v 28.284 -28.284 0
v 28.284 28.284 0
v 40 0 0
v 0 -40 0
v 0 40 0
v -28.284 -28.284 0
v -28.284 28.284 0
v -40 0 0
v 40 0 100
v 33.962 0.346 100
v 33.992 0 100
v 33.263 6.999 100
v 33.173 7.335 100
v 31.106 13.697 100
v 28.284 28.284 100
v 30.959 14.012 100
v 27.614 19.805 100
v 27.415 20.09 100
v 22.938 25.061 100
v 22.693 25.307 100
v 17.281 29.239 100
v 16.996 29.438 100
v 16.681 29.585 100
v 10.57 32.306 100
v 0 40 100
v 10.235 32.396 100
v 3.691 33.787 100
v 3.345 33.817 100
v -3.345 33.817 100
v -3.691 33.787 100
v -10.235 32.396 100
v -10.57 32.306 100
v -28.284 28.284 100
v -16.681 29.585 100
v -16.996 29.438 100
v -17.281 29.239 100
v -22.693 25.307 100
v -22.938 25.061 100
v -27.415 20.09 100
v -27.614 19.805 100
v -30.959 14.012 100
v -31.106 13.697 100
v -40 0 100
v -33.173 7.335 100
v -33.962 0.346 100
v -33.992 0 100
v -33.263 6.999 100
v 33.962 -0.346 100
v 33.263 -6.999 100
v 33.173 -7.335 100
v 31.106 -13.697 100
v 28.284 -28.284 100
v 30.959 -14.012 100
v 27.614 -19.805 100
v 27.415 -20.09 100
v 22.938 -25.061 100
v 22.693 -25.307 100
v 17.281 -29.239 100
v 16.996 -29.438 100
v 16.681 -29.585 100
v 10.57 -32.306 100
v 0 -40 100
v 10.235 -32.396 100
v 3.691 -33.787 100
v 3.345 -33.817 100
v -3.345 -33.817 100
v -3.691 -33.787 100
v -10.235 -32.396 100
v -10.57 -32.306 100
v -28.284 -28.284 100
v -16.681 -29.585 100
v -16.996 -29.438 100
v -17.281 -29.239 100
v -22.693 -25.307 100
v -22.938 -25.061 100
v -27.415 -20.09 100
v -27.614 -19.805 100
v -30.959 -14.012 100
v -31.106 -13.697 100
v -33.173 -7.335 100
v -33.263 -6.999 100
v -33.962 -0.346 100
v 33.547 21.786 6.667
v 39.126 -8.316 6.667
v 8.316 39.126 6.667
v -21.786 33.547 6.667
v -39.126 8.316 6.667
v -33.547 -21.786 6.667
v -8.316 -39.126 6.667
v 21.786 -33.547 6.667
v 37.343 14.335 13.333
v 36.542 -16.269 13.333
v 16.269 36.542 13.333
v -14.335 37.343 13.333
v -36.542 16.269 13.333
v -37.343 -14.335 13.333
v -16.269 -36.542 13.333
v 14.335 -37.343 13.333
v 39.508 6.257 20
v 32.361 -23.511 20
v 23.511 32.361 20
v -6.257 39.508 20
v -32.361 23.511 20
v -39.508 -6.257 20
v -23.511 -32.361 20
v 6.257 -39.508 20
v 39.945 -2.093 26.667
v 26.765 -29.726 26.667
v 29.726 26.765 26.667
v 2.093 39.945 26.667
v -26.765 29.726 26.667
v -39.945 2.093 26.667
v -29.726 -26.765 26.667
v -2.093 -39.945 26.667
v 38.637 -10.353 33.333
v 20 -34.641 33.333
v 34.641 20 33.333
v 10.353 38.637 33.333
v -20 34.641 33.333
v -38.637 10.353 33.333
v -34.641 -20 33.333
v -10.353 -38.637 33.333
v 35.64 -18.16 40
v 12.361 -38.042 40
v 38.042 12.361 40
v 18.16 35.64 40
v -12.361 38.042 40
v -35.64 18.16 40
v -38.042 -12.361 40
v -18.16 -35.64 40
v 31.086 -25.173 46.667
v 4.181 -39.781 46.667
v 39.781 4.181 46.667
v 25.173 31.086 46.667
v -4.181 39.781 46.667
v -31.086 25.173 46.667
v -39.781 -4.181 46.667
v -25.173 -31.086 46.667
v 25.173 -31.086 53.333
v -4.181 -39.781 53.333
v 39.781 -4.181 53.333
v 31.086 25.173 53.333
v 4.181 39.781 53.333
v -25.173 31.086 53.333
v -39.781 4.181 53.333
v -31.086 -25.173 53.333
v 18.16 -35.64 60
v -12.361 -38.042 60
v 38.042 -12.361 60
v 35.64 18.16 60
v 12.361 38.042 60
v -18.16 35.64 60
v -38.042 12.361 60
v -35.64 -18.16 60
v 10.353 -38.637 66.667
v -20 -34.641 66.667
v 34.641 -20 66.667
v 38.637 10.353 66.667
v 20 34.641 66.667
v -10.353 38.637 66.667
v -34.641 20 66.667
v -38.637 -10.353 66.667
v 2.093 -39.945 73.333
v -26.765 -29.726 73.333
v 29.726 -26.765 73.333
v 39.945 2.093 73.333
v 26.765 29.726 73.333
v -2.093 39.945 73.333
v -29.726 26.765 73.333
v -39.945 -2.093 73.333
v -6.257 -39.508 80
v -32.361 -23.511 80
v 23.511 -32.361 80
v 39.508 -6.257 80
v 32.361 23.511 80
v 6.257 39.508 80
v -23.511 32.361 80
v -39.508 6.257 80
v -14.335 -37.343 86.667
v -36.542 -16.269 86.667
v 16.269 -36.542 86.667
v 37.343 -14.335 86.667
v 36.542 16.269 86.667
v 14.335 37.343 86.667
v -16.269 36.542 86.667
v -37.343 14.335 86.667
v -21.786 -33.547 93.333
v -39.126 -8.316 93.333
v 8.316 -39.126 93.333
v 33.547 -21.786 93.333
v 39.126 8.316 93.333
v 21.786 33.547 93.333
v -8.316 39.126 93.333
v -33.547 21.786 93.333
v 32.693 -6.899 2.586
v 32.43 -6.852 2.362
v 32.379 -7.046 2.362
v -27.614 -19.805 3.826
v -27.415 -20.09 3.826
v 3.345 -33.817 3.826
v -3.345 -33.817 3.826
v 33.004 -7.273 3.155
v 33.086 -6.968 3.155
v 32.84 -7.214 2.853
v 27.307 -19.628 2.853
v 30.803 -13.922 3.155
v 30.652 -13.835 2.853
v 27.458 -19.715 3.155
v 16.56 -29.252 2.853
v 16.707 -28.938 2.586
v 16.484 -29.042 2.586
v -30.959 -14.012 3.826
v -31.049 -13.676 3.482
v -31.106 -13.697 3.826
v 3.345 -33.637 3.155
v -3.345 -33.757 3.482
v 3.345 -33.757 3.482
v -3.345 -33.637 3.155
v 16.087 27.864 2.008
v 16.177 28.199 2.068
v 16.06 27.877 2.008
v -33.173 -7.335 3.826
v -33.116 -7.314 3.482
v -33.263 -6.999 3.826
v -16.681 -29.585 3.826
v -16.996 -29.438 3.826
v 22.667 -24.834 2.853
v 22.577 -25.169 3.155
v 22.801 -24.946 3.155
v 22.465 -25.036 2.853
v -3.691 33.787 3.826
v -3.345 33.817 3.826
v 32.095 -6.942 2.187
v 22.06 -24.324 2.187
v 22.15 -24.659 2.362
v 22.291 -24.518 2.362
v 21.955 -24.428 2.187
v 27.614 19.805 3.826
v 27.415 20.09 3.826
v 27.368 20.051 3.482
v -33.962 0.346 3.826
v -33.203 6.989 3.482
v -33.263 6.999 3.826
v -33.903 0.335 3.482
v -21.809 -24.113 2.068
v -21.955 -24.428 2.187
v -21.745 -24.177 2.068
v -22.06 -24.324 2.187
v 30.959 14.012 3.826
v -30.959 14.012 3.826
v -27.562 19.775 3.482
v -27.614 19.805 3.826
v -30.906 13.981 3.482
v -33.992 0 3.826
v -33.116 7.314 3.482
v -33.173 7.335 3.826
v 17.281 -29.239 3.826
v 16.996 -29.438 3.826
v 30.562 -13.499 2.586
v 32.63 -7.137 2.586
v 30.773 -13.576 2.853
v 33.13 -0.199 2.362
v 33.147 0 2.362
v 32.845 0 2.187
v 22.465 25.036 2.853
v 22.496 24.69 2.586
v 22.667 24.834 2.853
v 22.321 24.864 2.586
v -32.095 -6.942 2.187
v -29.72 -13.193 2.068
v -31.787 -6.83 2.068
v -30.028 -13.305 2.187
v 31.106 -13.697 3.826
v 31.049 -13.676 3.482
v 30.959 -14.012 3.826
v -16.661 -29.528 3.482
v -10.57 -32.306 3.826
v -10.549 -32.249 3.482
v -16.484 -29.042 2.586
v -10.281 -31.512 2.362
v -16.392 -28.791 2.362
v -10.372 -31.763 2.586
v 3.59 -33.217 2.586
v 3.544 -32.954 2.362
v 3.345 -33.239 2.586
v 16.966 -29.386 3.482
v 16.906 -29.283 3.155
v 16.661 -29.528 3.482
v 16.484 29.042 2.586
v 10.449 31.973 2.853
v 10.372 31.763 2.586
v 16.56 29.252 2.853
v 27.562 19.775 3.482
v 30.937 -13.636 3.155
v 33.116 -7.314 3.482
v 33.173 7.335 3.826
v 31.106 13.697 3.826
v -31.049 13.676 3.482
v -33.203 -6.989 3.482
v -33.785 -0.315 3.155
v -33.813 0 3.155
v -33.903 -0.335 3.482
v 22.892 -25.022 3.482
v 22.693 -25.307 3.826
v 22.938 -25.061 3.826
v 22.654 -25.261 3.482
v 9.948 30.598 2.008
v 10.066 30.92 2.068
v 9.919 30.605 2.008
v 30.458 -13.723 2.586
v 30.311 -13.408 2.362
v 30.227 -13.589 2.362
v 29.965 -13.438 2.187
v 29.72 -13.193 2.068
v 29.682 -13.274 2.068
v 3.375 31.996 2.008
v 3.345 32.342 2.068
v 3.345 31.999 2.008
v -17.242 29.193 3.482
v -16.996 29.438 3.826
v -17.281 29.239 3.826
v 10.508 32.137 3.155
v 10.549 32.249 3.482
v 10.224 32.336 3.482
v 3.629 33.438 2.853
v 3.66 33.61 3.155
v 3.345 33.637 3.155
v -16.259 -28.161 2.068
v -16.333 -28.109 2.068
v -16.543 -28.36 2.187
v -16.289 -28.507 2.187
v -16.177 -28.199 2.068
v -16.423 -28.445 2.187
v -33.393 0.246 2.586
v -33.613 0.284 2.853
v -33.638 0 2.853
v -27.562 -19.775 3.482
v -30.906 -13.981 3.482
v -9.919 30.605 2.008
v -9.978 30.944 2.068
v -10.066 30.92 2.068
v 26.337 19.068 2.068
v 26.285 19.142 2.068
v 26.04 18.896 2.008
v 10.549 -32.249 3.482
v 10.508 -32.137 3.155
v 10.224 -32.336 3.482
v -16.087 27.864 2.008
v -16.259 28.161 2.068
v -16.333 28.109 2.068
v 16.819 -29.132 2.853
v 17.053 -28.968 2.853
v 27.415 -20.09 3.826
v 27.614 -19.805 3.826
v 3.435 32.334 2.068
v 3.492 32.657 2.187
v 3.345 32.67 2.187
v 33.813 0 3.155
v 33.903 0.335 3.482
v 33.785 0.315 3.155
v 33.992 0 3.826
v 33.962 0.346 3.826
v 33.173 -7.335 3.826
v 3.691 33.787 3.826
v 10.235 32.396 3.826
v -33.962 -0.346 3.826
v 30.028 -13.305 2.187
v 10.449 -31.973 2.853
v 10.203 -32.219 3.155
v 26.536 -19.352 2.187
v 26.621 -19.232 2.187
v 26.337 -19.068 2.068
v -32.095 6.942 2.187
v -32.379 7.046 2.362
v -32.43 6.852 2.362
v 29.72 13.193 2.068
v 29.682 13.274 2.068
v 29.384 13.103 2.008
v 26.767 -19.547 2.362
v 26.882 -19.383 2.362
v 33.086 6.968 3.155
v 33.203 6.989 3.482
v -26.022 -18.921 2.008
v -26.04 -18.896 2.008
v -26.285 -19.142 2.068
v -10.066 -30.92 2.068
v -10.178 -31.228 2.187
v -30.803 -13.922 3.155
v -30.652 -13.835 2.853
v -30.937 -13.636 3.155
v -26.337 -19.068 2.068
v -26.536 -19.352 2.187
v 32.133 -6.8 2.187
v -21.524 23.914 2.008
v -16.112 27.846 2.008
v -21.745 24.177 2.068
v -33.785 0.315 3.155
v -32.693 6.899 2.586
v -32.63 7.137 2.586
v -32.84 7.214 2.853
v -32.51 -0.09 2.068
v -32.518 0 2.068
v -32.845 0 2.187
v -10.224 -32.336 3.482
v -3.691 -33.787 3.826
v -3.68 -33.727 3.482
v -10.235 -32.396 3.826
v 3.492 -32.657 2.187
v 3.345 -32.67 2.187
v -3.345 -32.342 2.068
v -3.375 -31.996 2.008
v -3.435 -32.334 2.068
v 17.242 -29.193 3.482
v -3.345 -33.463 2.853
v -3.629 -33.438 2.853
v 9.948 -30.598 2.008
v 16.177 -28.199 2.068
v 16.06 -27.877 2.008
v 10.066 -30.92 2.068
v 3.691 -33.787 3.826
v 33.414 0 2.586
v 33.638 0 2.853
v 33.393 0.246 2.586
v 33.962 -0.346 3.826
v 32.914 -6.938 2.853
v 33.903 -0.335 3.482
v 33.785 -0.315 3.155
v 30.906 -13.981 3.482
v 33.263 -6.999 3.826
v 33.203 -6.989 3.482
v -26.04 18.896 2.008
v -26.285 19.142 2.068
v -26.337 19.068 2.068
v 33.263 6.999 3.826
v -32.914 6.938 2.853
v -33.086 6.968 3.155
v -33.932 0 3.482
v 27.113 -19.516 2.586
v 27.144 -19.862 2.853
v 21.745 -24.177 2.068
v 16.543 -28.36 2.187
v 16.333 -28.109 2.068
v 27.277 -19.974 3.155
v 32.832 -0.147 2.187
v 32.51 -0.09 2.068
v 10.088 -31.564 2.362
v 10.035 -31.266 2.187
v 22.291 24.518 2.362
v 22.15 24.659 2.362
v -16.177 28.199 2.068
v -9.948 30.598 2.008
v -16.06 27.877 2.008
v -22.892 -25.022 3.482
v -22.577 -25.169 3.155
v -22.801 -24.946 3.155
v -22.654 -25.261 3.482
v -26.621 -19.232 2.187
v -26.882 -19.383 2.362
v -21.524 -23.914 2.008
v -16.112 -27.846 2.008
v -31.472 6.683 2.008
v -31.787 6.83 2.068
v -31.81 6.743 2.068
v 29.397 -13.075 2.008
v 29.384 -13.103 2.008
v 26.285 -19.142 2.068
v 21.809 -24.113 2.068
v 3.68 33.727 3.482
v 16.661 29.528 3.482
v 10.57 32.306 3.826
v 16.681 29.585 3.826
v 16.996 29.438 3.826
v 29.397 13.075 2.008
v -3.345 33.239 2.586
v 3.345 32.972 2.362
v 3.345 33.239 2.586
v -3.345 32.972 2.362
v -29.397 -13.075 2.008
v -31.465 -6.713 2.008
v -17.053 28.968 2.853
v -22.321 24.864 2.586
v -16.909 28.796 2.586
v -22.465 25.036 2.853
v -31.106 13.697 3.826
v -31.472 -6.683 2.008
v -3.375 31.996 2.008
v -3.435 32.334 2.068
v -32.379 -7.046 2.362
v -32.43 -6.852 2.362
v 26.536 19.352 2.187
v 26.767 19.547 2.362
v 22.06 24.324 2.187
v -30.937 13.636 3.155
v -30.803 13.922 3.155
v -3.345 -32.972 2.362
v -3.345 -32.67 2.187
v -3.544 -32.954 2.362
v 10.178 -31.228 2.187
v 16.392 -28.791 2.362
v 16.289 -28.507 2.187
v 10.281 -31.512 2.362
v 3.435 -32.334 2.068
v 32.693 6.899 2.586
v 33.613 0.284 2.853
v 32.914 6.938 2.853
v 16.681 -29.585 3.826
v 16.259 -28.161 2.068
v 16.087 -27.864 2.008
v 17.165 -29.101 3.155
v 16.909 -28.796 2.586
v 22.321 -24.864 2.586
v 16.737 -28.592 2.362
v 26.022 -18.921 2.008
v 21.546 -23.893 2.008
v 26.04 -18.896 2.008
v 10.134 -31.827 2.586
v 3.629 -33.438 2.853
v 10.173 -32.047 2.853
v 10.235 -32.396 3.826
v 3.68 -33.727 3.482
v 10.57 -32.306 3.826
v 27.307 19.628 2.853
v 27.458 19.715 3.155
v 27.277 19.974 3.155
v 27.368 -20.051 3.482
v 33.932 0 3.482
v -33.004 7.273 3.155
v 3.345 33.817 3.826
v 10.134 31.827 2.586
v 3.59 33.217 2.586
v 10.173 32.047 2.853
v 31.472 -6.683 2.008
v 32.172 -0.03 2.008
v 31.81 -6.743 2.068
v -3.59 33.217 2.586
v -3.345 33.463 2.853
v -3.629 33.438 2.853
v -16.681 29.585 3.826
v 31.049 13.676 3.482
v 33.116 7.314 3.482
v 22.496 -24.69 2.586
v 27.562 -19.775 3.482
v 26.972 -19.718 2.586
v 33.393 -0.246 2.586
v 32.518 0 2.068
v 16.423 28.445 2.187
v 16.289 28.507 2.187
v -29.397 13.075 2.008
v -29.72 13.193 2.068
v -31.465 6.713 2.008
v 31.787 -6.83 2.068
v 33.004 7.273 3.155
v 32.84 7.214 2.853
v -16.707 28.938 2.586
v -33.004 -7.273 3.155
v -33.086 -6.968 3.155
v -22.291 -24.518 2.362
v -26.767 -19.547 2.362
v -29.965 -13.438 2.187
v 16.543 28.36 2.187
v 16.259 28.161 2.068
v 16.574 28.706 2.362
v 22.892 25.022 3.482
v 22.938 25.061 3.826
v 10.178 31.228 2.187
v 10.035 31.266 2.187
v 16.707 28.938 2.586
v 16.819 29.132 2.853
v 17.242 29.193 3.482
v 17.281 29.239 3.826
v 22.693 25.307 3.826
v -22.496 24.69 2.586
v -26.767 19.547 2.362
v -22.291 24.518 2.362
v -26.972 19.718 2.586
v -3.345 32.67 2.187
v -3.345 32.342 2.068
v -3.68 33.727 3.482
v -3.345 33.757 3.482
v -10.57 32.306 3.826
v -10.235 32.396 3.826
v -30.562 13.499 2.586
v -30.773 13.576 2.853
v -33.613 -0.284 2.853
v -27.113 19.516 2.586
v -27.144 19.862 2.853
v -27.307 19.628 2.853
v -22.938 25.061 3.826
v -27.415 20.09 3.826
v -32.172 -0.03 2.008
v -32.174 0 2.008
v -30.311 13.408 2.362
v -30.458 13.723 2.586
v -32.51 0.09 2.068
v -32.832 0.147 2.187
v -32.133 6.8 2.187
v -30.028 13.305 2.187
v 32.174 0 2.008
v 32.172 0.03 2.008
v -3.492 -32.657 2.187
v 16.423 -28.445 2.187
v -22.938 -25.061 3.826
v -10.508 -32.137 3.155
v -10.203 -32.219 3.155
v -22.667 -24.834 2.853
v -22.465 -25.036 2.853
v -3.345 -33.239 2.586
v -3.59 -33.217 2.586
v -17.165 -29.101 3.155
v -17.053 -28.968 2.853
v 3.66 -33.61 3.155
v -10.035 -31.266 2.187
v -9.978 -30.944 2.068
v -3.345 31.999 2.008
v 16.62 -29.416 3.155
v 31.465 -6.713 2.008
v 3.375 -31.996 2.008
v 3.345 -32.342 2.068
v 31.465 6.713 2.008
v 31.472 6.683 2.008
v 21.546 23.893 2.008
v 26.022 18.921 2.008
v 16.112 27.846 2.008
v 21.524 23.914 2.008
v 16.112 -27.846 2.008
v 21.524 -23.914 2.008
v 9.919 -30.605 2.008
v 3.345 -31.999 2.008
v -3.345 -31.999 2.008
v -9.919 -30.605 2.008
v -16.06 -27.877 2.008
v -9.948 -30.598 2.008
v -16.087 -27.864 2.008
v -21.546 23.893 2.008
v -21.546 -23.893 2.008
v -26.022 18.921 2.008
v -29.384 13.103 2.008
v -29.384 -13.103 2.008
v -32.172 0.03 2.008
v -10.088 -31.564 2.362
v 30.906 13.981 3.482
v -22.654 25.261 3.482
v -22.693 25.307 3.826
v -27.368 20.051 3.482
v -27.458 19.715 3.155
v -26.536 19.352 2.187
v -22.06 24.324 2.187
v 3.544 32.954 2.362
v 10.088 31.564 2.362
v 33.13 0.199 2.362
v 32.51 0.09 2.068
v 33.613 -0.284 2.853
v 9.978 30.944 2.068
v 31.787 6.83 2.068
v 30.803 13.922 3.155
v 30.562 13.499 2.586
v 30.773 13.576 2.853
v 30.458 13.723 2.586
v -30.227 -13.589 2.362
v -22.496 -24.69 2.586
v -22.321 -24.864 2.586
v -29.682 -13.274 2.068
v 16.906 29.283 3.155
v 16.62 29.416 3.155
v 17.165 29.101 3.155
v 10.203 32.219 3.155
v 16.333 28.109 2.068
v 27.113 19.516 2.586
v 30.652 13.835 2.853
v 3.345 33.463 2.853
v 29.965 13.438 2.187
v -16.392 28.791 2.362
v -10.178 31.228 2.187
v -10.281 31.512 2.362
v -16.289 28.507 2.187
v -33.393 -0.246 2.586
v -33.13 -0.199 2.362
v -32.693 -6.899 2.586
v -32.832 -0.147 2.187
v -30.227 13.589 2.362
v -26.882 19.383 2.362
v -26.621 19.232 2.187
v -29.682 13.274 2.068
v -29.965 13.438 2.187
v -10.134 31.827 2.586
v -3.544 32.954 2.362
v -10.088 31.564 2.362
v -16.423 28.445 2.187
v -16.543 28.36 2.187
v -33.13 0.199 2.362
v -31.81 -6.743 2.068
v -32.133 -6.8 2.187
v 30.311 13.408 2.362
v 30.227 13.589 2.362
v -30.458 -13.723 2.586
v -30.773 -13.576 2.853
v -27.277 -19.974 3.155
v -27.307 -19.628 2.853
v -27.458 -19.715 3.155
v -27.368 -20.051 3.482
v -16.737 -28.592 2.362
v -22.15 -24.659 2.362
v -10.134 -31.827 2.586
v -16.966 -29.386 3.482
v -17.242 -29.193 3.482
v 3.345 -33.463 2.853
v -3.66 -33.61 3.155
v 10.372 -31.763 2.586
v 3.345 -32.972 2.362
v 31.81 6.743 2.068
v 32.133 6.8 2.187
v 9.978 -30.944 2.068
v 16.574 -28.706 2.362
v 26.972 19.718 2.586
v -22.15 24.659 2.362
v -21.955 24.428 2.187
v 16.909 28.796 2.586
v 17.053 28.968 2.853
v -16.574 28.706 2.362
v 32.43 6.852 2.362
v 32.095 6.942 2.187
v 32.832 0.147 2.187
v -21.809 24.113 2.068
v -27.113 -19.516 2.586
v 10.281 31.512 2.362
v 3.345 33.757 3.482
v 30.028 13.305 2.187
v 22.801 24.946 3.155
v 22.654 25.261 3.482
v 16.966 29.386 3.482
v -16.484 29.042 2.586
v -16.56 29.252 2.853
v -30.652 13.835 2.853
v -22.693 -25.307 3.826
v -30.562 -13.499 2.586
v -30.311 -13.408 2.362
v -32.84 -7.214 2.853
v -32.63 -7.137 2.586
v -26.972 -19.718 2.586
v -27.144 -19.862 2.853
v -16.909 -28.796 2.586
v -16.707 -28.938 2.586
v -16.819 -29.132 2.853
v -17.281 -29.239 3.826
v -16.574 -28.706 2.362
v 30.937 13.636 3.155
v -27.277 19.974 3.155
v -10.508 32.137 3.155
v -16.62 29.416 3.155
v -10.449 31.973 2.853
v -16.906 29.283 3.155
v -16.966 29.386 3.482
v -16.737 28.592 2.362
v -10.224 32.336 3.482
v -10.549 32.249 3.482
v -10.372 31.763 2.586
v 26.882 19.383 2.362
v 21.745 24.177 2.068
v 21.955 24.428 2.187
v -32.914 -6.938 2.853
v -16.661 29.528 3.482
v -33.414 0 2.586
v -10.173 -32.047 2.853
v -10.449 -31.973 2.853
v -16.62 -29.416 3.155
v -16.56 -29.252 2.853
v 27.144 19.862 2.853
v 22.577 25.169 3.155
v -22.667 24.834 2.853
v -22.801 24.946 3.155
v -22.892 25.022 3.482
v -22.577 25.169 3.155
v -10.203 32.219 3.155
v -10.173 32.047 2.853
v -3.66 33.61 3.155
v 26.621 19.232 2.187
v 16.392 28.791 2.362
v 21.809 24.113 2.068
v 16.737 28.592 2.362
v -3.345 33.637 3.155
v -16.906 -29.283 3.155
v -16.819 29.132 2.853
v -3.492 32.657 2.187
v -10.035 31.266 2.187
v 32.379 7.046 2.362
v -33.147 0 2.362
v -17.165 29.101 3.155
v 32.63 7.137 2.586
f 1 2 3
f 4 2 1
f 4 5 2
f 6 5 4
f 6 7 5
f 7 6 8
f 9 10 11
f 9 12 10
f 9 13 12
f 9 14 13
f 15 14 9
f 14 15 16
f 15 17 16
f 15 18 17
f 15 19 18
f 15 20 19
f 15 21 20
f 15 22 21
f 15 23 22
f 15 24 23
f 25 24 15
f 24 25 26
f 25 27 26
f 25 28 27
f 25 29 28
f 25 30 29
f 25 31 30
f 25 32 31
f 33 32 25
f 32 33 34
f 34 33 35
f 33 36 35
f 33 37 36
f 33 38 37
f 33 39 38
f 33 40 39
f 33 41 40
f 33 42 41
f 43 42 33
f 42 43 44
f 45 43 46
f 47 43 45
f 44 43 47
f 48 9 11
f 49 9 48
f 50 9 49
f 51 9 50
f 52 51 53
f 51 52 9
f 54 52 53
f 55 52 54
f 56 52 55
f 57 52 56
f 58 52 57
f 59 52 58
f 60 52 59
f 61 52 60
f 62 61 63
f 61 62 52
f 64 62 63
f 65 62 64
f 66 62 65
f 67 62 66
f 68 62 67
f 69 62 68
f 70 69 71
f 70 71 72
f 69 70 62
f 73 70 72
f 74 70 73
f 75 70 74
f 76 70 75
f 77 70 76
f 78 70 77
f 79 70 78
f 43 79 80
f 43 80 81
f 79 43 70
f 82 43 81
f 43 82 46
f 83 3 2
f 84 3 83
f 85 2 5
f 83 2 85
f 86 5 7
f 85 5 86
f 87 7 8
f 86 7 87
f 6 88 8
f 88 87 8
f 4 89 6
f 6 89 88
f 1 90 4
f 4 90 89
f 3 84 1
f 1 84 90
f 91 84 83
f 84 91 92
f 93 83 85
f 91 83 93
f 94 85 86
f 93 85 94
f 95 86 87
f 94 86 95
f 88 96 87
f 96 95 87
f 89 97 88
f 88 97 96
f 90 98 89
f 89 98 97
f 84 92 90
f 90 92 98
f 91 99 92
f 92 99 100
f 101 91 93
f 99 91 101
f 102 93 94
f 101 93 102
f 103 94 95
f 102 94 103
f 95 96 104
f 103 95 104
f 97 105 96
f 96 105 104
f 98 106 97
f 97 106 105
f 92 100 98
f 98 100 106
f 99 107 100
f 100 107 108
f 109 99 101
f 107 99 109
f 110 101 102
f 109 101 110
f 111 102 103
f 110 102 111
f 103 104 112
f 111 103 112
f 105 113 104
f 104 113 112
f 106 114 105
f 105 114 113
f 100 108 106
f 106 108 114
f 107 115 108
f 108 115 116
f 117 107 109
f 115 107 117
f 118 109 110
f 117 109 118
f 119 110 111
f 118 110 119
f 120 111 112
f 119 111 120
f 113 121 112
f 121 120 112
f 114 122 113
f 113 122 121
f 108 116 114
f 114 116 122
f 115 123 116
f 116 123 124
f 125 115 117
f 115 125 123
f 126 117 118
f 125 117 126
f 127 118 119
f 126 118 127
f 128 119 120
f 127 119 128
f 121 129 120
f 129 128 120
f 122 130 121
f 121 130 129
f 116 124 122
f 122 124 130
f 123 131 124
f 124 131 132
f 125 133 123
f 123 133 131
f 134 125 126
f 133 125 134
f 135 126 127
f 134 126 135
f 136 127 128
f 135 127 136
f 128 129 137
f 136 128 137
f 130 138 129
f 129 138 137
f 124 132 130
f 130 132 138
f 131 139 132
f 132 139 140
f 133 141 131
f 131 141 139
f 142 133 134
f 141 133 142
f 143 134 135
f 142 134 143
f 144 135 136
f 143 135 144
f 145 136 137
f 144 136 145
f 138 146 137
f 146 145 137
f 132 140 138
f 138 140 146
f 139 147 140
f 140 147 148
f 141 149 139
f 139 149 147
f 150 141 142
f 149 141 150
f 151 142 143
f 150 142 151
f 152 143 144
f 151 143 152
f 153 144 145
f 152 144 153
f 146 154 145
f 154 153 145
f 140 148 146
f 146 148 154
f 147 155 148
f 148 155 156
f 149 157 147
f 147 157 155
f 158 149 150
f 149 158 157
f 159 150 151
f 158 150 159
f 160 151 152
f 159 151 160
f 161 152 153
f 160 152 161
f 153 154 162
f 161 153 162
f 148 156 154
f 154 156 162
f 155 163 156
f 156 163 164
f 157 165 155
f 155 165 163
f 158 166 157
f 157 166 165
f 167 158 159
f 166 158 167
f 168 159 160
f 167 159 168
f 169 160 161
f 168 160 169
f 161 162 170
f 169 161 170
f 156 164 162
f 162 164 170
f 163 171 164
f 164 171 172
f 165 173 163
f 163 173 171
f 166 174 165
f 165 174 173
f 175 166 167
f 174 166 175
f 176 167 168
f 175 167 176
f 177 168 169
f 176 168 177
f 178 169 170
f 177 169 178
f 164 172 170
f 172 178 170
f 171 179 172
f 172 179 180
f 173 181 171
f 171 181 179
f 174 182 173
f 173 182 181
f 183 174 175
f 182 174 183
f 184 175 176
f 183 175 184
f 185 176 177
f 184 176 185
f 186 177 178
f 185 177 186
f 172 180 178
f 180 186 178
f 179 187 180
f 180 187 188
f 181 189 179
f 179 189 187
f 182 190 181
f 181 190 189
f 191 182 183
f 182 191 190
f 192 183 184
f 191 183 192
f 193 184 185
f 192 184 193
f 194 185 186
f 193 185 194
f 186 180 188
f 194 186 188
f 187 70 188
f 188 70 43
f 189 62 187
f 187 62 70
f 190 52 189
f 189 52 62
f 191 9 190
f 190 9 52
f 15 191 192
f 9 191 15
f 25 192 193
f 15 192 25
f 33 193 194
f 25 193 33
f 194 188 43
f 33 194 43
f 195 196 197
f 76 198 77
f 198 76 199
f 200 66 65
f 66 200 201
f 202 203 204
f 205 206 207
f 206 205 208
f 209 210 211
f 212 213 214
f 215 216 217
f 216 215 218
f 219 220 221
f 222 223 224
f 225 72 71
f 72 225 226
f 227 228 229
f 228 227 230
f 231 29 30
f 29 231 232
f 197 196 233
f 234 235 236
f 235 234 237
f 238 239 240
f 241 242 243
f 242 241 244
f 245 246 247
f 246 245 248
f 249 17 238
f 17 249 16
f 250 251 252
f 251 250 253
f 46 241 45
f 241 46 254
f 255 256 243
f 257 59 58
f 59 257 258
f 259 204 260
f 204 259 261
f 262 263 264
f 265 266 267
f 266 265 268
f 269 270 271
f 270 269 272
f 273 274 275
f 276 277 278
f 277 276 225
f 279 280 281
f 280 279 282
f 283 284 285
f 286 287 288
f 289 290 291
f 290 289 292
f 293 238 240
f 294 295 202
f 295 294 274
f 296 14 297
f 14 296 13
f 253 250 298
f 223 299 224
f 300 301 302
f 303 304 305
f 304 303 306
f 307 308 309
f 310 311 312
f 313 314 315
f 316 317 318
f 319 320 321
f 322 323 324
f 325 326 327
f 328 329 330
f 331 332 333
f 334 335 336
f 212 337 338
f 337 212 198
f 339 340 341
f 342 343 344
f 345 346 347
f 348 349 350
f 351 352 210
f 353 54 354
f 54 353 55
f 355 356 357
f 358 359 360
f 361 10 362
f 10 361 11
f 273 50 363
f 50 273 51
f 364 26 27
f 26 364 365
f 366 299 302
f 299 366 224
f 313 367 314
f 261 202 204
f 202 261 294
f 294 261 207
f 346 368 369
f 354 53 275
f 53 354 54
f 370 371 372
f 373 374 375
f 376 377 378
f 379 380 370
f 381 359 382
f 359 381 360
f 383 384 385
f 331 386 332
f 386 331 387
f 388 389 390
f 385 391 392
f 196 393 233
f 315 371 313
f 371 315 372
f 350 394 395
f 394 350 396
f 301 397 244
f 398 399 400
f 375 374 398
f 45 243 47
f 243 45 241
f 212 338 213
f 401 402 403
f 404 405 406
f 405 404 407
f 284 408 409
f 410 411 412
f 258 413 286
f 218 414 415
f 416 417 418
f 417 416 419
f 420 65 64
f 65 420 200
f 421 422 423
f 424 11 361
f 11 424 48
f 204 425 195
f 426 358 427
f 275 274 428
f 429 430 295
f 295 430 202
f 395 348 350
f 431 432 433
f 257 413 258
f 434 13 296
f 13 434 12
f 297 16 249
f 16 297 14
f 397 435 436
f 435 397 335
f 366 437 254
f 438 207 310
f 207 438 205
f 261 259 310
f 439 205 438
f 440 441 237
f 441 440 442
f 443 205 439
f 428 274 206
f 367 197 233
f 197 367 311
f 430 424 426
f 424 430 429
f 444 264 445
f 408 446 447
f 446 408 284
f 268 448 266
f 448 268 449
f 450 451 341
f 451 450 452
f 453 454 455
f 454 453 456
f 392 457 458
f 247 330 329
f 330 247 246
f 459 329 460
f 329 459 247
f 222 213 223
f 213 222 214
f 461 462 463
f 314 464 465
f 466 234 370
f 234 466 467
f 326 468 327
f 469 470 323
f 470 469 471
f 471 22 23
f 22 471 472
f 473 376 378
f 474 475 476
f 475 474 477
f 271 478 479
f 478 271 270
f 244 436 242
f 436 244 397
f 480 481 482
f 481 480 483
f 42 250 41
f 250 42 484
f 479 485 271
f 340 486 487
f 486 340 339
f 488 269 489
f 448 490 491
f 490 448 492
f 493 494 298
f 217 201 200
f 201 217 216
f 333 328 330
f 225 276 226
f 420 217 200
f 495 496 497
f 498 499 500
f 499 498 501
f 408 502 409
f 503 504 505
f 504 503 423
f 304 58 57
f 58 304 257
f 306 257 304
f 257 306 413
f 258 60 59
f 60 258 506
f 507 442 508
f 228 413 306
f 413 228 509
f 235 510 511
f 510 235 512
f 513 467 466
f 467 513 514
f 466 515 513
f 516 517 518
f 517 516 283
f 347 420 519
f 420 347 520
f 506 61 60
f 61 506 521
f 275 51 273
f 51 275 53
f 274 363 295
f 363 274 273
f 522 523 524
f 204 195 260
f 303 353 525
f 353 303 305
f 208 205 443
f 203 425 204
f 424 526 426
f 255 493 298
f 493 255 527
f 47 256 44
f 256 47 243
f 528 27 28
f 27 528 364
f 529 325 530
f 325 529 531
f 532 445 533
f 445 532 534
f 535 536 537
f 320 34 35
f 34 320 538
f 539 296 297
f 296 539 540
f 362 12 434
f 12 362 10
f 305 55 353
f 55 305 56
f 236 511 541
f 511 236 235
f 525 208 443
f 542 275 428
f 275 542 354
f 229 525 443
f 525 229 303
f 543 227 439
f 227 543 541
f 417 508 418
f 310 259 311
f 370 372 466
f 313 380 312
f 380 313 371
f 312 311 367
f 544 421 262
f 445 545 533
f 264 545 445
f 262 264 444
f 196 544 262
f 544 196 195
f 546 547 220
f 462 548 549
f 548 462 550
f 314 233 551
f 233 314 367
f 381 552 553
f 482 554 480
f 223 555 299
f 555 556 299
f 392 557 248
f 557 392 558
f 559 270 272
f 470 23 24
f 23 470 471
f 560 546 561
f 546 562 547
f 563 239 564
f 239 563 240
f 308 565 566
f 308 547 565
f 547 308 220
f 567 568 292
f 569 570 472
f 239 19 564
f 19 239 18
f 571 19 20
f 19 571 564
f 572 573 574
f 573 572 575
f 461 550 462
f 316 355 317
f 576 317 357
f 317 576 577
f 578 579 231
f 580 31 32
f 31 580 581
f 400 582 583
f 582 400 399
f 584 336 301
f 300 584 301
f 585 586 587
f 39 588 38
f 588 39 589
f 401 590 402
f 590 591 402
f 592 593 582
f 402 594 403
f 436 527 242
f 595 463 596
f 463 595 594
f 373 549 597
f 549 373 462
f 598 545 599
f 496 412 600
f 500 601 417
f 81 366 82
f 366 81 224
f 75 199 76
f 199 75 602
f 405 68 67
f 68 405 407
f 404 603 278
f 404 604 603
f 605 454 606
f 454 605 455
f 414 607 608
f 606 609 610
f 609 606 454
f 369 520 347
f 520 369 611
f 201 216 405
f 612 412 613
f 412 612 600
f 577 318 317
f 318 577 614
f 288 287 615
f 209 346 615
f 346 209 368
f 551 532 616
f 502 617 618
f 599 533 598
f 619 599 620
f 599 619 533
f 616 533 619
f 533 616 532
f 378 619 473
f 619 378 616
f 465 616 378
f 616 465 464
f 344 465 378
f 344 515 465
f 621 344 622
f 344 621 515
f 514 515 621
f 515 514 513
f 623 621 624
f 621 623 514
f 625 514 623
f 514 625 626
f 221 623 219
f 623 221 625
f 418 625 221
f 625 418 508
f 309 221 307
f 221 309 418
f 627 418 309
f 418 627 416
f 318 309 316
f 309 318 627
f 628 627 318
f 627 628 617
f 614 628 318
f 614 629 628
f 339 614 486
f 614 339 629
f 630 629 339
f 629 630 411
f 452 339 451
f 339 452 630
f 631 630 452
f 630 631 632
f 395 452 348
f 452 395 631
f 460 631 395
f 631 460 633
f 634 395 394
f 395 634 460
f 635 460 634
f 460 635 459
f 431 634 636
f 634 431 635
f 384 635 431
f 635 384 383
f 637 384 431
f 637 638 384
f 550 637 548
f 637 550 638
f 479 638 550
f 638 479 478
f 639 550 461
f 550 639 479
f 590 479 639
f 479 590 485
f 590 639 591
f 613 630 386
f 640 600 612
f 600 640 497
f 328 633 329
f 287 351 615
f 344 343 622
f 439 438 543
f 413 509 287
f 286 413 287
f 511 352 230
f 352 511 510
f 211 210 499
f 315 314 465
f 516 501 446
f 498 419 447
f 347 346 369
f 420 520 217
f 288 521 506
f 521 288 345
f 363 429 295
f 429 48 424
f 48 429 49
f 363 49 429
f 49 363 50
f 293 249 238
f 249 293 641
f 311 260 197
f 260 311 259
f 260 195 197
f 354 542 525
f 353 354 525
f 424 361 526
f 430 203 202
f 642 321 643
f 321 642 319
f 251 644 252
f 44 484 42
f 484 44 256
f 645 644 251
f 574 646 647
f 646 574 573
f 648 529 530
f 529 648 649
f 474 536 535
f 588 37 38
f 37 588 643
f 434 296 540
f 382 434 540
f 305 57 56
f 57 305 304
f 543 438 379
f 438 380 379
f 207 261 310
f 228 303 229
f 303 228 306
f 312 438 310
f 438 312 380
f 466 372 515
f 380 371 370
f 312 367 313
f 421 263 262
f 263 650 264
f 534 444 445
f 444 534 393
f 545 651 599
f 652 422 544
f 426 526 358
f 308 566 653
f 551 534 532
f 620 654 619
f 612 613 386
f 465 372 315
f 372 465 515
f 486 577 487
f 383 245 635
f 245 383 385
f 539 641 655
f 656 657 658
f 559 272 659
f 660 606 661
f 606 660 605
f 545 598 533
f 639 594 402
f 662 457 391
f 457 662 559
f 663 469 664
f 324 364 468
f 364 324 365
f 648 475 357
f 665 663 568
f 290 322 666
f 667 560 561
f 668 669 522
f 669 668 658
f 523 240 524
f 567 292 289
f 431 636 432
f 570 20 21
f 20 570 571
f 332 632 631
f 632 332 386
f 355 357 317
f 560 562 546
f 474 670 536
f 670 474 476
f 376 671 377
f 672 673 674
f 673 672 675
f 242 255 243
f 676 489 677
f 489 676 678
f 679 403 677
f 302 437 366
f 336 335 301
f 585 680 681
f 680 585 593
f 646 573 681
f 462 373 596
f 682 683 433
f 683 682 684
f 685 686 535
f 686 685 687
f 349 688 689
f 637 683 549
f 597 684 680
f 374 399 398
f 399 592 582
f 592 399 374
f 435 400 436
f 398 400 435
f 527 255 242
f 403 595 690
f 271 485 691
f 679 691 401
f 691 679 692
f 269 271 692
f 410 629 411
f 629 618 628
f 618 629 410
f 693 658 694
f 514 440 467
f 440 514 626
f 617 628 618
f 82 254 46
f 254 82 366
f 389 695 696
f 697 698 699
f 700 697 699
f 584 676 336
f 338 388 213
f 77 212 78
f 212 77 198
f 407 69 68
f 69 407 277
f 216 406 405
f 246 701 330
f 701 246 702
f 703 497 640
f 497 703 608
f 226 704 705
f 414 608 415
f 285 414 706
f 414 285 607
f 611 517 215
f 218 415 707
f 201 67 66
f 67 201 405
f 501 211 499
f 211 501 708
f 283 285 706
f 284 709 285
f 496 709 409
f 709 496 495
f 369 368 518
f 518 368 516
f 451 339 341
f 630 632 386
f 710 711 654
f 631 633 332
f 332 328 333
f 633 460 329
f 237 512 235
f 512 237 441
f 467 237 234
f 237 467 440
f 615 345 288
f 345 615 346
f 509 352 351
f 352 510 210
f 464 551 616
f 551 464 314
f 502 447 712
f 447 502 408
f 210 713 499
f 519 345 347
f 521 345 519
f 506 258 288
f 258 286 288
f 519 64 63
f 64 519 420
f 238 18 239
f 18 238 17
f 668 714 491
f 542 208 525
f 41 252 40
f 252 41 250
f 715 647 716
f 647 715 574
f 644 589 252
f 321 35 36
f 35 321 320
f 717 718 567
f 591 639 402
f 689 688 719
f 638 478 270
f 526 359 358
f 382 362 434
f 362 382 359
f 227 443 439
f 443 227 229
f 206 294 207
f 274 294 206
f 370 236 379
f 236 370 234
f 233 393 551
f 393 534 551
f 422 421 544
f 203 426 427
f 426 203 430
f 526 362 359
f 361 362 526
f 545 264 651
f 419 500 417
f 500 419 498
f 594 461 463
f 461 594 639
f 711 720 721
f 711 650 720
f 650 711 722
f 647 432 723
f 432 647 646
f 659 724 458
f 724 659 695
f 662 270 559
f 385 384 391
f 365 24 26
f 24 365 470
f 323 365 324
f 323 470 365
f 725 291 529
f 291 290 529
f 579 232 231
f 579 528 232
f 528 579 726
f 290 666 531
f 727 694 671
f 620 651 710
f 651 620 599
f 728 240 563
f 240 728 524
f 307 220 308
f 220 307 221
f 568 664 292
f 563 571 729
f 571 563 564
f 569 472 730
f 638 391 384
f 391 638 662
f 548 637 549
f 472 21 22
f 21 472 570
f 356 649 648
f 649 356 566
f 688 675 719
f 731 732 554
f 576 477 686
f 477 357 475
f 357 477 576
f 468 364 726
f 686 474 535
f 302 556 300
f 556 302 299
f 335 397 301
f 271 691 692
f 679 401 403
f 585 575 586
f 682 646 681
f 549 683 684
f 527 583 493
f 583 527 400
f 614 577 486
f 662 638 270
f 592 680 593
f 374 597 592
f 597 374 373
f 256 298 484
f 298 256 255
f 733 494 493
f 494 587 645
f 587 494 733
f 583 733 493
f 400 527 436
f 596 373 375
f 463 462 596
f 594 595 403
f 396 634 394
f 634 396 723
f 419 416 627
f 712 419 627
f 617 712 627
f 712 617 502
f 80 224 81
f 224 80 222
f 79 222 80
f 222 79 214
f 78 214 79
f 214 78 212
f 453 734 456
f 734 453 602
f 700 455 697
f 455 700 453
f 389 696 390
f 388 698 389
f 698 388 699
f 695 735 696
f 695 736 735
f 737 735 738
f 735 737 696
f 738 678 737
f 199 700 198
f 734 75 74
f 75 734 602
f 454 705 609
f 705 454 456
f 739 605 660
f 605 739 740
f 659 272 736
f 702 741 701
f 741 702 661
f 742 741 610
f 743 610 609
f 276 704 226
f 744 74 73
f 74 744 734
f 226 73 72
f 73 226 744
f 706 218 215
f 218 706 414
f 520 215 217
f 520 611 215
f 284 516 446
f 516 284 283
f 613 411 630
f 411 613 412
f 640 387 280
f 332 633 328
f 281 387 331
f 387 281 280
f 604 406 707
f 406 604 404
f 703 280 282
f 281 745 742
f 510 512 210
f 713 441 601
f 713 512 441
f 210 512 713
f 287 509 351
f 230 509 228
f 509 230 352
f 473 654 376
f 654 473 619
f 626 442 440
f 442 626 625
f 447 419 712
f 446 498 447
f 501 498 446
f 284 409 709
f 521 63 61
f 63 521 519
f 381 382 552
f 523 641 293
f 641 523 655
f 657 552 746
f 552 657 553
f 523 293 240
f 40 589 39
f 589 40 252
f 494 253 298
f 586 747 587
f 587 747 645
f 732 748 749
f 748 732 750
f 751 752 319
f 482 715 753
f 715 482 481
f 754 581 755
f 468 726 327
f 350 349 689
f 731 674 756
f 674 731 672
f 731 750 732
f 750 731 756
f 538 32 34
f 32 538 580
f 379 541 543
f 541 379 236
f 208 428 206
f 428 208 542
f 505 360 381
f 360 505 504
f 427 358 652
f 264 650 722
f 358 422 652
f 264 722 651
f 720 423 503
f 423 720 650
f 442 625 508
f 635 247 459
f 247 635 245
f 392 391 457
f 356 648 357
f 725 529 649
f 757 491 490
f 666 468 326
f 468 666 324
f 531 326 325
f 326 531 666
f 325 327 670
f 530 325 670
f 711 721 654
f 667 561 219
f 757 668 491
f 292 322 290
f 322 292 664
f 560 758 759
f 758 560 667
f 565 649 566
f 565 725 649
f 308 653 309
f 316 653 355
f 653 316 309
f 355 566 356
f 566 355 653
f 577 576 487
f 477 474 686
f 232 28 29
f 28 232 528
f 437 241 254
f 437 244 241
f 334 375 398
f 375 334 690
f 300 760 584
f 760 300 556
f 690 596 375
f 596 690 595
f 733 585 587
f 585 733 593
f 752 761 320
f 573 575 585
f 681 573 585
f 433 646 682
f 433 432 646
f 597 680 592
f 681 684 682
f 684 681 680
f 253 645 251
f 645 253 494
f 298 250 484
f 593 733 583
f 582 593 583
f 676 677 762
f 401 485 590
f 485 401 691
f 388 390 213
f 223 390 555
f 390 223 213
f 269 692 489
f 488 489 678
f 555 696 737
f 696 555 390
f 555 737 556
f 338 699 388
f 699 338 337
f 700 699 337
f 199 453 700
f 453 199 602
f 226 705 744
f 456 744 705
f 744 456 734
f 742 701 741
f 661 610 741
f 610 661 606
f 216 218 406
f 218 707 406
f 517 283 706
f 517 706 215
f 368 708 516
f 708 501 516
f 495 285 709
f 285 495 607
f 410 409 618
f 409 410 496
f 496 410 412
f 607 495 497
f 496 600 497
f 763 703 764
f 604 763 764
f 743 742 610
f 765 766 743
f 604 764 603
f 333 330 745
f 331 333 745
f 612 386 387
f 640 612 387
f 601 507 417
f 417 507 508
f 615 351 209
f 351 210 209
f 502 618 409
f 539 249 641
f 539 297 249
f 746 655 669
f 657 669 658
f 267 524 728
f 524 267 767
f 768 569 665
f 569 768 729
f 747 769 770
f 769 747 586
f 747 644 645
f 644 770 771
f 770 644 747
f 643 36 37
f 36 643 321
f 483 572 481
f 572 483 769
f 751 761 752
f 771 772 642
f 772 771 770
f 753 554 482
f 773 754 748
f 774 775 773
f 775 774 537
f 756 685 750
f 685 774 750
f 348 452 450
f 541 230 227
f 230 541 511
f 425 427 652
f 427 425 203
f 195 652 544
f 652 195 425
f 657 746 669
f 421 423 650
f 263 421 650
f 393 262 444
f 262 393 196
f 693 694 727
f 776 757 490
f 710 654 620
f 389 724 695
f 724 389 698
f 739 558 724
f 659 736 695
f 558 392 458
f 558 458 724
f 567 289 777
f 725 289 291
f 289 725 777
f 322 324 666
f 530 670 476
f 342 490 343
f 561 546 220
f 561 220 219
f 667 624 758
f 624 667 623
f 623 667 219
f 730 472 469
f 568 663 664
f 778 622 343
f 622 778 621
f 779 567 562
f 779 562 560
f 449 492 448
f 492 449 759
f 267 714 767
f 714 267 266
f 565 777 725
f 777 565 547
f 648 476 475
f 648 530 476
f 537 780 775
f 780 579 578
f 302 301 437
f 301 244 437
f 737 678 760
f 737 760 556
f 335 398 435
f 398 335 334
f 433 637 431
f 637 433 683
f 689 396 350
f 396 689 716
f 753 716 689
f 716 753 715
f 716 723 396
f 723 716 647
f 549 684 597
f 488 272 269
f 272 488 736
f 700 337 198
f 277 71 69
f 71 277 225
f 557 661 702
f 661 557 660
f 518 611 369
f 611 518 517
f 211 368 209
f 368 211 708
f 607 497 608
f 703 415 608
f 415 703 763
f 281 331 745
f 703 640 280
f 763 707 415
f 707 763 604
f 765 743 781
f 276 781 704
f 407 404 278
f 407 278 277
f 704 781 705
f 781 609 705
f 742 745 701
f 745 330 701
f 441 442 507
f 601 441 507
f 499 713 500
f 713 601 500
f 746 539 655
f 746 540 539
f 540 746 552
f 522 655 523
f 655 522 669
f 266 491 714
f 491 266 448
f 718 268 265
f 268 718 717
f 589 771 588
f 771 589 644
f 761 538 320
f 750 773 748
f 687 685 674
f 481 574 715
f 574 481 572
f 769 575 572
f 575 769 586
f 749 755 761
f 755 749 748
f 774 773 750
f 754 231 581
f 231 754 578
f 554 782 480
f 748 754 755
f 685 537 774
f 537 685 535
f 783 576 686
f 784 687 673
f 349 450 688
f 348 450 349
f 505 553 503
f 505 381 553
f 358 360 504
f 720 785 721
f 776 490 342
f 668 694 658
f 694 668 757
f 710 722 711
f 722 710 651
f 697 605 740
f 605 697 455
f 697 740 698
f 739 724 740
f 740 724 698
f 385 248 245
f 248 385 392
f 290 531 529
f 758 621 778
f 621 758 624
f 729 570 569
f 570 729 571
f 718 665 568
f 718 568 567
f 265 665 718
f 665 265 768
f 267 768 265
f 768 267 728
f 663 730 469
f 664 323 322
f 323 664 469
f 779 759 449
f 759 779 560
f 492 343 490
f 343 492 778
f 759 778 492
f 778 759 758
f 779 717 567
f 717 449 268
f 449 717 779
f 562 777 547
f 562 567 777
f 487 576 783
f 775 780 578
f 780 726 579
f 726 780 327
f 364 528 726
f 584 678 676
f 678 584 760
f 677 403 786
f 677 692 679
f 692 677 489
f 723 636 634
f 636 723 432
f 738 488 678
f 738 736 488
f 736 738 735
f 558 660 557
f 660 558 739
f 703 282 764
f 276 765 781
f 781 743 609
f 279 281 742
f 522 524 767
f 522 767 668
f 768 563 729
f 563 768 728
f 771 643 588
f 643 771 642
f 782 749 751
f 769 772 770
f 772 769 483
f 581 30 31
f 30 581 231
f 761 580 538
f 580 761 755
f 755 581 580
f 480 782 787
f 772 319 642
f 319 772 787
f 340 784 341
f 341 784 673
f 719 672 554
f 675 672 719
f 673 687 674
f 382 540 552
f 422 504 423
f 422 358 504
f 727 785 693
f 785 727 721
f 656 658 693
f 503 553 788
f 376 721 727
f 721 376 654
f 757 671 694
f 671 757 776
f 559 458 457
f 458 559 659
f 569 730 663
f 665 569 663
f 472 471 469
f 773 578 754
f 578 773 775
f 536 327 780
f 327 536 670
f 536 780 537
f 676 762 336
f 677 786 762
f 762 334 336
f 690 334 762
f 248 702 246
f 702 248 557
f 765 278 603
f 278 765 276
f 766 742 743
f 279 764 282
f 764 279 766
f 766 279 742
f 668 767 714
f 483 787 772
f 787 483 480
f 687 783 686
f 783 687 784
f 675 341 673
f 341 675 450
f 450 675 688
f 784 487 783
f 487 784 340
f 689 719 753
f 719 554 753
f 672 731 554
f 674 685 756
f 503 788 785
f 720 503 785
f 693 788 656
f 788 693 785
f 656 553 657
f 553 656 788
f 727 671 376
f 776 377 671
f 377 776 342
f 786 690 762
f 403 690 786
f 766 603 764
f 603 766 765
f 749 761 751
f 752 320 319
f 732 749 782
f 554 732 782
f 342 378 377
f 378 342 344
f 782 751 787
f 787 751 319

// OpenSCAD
OD = 80;
BaseFacets = 8;
CupHeight = 100;
BaseThickness = 4;

module outerShape() {
    linear_extrude(height=CupHeight, twist=180)
    circle(d=OD, $fn=BaseFacets);
}

module innerShape() {
    color("purple")
    translate([0, 0, BaseThickness])
    minkowski() {
        cylinder(d=OD*.8, h = CupHeight);
        sphere(r=2, $fn = 36);
    }
}

module cupShape() {
    difference() {
        outerShape();
        
        innerShape();
    }
}


//innerShape();
//outerShape();
cupShape();
